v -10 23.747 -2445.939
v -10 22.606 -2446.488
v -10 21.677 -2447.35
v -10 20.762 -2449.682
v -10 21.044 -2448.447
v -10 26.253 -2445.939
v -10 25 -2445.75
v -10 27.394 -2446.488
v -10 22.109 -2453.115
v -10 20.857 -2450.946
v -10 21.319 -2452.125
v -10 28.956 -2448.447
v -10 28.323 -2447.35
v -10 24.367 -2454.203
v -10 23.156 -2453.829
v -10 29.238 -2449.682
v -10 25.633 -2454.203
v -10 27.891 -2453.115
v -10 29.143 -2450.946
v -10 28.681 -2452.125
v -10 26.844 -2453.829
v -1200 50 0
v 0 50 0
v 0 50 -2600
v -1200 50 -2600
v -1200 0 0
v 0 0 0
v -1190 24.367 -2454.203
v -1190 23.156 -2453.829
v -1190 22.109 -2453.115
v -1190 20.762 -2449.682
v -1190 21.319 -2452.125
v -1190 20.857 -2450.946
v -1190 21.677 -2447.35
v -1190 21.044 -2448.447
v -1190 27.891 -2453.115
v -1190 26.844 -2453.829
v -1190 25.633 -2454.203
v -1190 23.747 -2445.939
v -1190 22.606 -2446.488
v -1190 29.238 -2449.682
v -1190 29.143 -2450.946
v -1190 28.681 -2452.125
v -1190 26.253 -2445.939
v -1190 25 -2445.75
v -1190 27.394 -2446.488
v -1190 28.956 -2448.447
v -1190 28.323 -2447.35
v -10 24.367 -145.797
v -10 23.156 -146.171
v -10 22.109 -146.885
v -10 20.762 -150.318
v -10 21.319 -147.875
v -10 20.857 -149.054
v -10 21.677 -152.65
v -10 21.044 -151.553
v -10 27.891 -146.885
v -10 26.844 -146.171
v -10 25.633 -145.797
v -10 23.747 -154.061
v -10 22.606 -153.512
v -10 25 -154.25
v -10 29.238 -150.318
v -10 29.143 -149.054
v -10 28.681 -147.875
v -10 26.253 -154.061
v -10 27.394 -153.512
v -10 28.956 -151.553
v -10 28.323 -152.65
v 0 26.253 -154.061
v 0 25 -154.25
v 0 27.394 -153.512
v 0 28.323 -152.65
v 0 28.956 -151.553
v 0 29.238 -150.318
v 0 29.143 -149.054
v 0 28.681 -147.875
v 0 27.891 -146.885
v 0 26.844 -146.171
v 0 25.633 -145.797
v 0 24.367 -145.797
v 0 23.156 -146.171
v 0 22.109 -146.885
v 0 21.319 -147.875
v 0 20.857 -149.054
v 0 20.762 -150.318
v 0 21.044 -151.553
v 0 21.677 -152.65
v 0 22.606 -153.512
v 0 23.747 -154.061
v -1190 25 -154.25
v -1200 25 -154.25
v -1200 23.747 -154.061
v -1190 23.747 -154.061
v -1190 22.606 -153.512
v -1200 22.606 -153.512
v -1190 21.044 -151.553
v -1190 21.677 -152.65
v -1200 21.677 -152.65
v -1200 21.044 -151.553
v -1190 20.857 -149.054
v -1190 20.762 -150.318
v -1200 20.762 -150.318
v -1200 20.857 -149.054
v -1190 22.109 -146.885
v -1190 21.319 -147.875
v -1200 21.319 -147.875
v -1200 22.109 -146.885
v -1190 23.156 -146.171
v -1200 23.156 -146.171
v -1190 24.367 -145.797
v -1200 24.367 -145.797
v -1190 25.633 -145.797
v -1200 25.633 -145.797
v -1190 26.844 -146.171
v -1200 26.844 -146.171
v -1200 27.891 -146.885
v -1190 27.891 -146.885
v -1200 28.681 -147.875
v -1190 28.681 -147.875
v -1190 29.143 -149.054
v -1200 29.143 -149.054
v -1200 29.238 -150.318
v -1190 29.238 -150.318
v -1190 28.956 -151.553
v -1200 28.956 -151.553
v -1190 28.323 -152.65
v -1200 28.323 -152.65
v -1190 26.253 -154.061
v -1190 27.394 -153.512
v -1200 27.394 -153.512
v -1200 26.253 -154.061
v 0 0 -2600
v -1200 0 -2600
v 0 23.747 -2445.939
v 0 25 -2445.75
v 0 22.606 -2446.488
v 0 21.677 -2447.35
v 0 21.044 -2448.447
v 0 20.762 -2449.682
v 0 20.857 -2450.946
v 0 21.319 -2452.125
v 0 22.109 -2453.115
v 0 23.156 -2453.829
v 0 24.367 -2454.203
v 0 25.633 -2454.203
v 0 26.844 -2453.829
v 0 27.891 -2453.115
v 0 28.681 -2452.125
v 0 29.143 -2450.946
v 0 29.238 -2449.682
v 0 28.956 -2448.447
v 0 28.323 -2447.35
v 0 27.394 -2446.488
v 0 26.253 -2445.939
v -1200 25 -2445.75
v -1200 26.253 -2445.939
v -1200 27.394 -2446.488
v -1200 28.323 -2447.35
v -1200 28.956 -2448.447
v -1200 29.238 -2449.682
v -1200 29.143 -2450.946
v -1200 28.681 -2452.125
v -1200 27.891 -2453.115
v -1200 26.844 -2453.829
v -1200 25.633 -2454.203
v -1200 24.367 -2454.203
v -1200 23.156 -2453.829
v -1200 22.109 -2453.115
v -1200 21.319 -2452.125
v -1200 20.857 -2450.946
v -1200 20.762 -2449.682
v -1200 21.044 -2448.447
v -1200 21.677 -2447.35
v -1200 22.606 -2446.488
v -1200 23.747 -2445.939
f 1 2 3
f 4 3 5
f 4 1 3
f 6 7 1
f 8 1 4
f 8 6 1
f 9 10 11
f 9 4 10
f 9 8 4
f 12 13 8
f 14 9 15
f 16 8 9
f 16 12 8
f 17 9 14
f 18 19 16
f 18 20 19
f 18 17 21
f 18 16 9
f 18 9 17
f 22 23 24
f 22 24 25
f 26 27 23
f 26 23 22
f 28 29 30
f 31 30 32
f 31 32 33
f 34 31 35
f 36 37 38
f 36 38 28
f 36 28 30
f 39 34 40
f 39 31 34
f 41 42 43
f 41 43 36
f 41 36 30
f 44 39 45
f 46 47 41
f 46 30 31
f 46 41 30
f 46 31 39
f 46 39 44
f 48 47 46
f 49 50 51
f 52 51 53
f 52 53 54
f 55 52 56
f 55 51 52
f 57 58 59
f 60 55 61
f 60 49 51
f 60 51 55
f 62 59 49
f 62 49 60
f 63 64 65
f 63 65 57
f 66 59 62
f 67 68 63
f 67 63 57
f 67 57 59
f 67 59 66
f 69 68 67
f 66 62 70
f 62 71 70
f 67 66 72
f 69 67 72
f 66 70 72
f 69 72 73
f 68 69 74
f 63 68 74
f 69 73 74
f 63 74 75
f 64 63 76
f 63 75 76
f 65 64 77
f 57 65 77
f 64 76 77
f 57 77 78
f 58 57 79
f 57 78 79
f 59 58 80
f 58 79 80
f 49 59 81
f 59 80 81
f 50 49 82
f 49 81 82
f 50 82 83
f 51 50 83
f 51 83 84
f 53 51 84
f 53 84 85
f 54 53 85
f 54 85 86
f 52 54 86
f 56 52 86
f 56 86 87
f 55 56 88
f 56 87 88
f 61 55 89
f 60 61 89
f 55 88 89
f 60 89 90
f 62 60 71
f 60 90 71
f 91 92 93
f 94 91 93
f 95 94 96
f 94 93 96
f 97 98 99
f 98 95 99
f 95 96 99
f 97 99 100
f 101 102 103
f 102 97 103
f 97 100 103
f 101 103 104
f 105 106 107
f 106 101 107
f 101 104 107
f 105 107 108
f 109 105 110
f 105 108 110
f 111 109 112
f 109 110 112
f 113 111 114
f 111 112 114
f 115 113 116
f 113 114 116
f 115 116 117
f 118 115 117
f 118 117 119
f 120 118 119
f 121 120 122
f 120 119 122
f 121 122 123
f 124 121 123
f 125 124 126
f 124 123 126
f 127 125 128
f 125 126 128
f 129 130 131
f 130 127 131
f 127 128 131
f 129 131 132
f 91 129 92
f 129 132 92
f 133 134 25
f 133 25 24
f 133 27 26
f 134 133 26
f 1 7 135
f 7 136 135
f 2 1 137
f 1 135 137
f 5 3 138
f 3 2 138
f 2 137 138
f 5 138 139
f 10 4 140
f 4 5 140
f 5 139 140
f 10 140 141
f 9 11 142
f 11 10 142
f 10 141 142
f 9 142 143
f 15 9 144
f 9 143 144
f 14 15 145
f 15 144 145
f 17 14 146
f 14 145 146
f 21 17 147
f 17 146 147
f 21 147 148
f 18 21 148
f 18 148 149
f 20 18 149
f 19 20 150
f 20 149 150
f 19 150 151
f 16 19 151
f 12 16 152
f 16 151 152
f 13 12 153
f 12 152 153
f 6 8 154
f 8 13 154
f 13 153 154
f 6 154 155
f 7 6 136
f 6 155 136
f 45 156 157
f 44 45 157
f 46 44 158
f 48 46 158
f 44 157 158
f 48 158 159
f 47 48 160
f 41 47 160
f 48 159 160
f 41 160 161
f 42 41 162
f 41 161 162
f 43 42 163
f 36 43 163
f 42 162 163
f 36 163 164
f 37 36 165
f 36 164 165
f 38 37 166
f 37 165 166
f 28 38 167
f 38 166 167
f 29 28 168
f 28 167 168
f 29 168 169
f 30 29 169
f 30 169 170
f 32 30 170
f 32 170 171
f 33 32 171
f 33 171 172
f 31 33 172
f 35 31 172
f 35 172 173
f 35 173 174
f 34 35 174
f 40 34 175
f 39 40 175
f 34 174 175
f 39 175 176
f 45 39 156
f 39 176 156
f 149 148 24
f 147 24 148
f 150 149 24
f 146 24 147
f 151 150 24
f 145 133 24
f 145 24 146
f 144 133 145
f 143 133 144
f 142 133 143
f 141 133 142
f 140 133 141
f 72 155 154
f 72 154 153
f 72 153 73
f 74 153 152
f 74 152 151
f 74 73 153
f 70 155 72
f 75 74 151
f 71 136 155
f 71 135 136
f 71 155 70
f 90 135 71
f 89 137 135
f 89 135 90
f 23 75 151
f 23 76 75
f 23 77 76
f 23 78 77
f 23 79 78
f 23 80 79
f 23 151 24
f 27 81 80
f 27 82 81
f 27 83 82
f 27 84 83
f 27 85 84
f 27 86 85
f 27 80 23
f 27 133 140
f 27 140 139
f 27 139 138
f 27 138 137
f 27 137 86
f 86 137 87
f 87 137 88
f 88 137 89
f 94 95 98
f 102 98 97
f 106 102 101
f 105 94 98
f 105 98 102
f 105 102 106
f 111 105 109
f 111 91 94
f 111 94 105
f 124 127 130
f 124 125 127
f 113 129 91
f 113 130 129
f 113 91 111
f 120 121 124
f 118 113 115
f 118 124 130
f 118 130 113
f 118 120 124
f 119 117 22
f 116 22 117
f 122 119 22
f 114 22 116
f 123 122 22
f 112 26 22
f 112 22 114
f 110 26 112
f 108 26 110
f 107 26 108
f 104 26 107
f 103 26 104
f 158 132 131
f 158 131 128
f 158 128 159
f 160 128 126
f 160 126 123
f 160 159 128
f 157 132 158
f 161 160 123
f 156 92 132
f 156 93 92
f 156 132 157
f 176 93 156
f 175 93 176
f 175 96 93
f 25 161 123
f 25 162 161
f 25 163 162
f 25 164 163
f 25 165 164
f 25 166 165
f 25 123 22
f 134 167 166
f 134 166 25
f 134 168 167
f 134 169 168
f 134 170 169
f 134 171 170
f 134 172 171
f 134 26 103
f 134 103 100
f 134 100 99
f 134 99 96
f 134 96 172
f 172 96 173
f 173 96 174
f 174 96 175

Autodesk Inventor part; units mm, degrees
ref_plane "YZ Plane" through (0, 0, 0) normal (1, 0, 0) x (0, 1, 0)
sketch "Sketch1" plane through (0, 0, 0) normal (0, 1, 0) x (-1, 0, 0)
  line L0 (0, 0) -> (1200, 0)
  line L1 (1200, 0) -> (1200, -2600)
  line L2 (1200, -2600) -> (0, -2600)
  line L3 (0, -2600) -> (0, 0)
  dimension "d0" = 1200
  dimension "d1" = 2600
extrude "Extrusion1" add sketch "Sketch1" along normal blind 50
sketch "Sketch2" plane through (0, 0, 0) normal (1, 0, 0) x (0, 0, -1)
  circle A0 centre (150, 25) radius 4.25
  line L0 (2600, 0) -> (0, 0) projected
  line L1 (0, 0) -> (0, 50) projected
  dimension "d4" = 8.5
  dimension "d5" = 25
  dimension "d8" = 150
extrude "Extrusion2" cut sketch "Sketch2" against normal blind 10
ref_plane "Work Plane2" through (-1200, 0, -1300) normal (0, 0, 1) x (1, 0, 0)
ref_plane "Work Plane3" through (-600, 0, -2600) normal (-1, 0, 0) x (0, 0, 1)
mirror "Mirror1" about plane through (-1200, 0, -1300) normal (0, 0, 1) of "Extrusion2"
mirror "Mirror2" about plane through (-600, 0, -2600) normal (-1, 0, 0) of "Extrusion2", "Mirror1"
properties part number "InsulatorWallNorrowasa" material "Polyethylene, Low Density"
